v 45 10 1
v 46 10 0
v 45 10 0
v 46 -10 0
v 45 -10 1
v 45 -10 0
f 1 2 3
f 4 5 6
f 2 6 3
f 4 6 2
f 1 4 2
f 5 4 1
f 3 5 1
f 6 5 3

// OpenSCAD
/*
Triangles.scad
 Author: Tim Koopman
 https://github.com/tkoopman/Delta-Diamond/blob/master/OpenSCAD/Triangles.scad

         angleCA
           /|\
        a / H \ c
         /  |  \
 angleAB ------- angleBC
            b

Standard Parameters
	center: true/false
		If true same as centerXYZ = [true, true, true]

	centerXYZ: Vector of 3 true/false values [CenterX, CenterY, CenterZ]
		center must be left undef

	height: The 3D height of the Triangle. Ignored if heights defined

	heights: Vector of 3 height values heights @ [angleAB, angleBC, angleCA]
		If CenterZ is true each height will be centered individually, this means
		the shape will be different depending on CenterZ. Most times you will want
		CenterZ to be true to get the shape most people want.
*/

/* 
Triangle
	a: Length of side a
	b: Length of side b
	angle: angle at point angleAB
*/
module Triangle(
			a, b, angle, height=1, heights=undef,
			center=undef, centerXYZ=[false,false,false])
{
	// Calculate Heights at each point
	heightAB = ((heights==undef) ? height : heights[0])/2;
	heightBC = ((heights==undef) ? height : heights[1])/2;
	heightCA = ((heights==undef) ? height : heights[2])/2;
	centerZ = (center || (center==undef && centerXYZ[2]))?0:max(heightAB,heightBC,heightCA);

	// Calculate Offsets for centering
	offsetX = (center || (center==undef && centerXYZ[0]))?((cos(angle)*a)+b)/3:0;
	offsetY = (center || (center==undef && centerXYZ[1]))?(sin(angle)*a)/3:0;
	
	pointAB1 = [-offsetX,-offsetY, centerZ-heightAB];
	pointAB2 = [-offsetX,-offsetY, centerZ+heightAB];
	pointBC1 = [b-offsetX,-offsetY, centerZ-heightBC];
	pointBC2 = [b-offsetX,-offsetY, centerZ+heightBC];
	pointCA1 = [(cos(angle)*a)-offsetX,(sin(angle)*a)-offsetY, centerZ-heightCA];
	pointCA2 = [(cos(angle)*a)-offsetX,(sin(angle)*a)-offsetY, centerZ+heightCA];

	polyhedron(
		points=[	pointAB1, pointBC1, pointCA1,
					pointAB2, pointBC2, pointCA2 ],
		triangles=[	
			[0, 1, 2],
			[3, 5, 4],
			[0, 3, 1],
			[1, 3, 4],
			[1, 4, 2],
			[2, 4, 5],
			[2, 5, 0],
			[0, 5, 3] ] );
}

/*
Isosceles Triangle
	Exactly 2 of the following paramaters must be defined.
	If all 3 defined H will be ignored.
	b: length of side b
	angle: angle at points angleAB & angleBC.
*/
module Isosceles_Triangle(
			b, angle, H=undef, height=1, heights=undef,
			center=undef, centerXYZ=[true, false, false])
{
	valid = 	(angle!=undef)?((angle < 90) && (b!=undef||H!=undef)) : (b!=undef&&H!=undef);
	ANGLE = (angle!=undef) ? angle : atan(H / (b/2));
	a = (b==undef)?(H/sin((180-(angle*2))/2)) : 
		 (b / cos(ANGLE))/2;
	B = (b==undef)? (cos(angle)*a)*2:b;
	if (valid)
	{
		Triangle(a=a, b=B, angle=ANGLE, height=height, heights=heights,
					center=center, centerXYZ=centerXYZ);
	} else {
		echo("Invalid Isosceles_Triangle. Must specify any 2 of b, angle and H, and if angle used angle must be less than 90");
	}
}

/*
Right Angled Triangle
	Create a Right Angled Triangle where the hypotenuse will be calculated.

       |\
      a| \
       |  \
       ----
         b
	a: length of side a
	b: length of side b
*/
module Right_Angled_Triangle(
			a, b, height=1, heights=undef,
			center=undef, centerXYZ=[false, false, false])
{
	Triangle(a=a, b=b, angle=90, height=height, heights=heights,
				center=center, centerXYZ=centerXYZ);
}

/*
Wedge
	Is same as Right Angled Triangle with 2 different heights, and rotated.
	Good for creating support structures.
*/
module Wedge(a, b, w1, w2)
{
	rotate([90,0,0])
		Right_Angled_Triangle(a, b, heights=[w1, w2, w1], centerXYZ=[false, false, true]);
}

/*
Equilateral Triangle
	Create a Equilateral Triangle.

	l: Length of all sides (a, b & c)
	H: Triangle size will be based on the this 2D height
		When using H, l is ignored.
*/
module Equilateral_Triangle(
			l=10, H=undef, height=1, heights=undef,
			center=undef, centerXYZ=[true,false,false])
{
	L = (H==undef)?l:H/sin(60);
	Triangle(a=L,b=L,angle=60,height=height, heights=heights,
				center=center, centerXYZ=centerXYZ);
}

/*
Trapezoid
	Create a Basic Trapezoid (Based on Isosceles_Triangle)

            d
          /----\
         /  |   \
     a  /   H    \ c
       /    |     \
 angle ------------ angle
            b

	b: Length of side b
	angle: Angle at points angleAB & angleBC
	H: The 2D height at which the triangle should be cut to create the trapezoid
	heights: If vector of size 3 (Standard for triangles) both cd & da will be the same height, if vector have 4 values [ab,bc,cd,da] than each point can have different heights.
*/
module Trapezoid(
			b, angle=60, H, height=1, heights=undef,
			center=undef, centerXYZ=[true,false,false])
{
	validAngle = (angle < 90);
	adX = H / tan(angle);

	// Calculate Heights at each point
	heightAB = ((heights==undef) ? height : heights[0])/2;
	heightBC = ((heights==undef) ? height : heights[1])/2;
	heightCD = ((heights==undef) ? height : heights[2])/2;
	heightDA = ((heights==undef) ? height : ((len(heights) > 3)?heights[3]:heights[2]))/2;

	// Centers
	centerX = (center || (center==undef && centerXYZ[0]))?0:b/2;
	centerY = (center || (center==undef && centerXYZ[1]))?0:H/2;
	centerZ = (center || (center==undef && centerXYZ[2]))?0:max(heightAB,heightBC,heightCD,heightDA);

	// Points
	y = H/2;
	bx = b/2;
	dx = (b-(adX*2))/2;

	pointAB1 = [centerX-bx, centerY-y, centerZ-heightAB];
	pointAB2 = [centerX-bx, centerY-y, centerZ+heightAB];
	pointBC1 = [centerX+bx, centerY-y, centerZ-heightBC];
	pointBC2 = [centerX+bx, centerY-y, centerZ+heightBC];
	pointCD1 = [centerX+dx, centerY+y, centerZ-heightCD];
	pointCD2 = [centerX+dx, centerY+y, centerZ+heightCD];
	pointDA1 = [centerX-dx, centerY+y, centerZ-heightDA];
	pointDA2 = [centerX-dx, centerY+y, centerZ+heightDA];

	validH = (adX < b/2);

	if (validAngle && validH)
	{
		polyhedron(
			points=[	pointAB1, pointBC1, pointCD1, pointDA1,
						pointAB2, pointBC2, pointCD2, pointDA2 ],
			triangles=[	
				[0, 1, 2],
				[0, 2, 3],
				[4, 6, 5],
				[4, 7, 6],
				[0, 4, 1],
				[1, 4, 5],
				[1, 5, 2],
				[2, 5, 6],
				[2, 6, 3],
				[3, 6, 7],
				[3, 7, 0],
				[0, 7, 4]	] );
	} else {
		if (!validAngle) echo("Trapezoid invalid, angle must be less than 90");
		else echo("Trapezoid invalid, H is larger than triangle");
	}
}


// Examples
Triangle(a=5, b=15, angle=33, centerXYZ=[true,false,false]);
translate([20,0,0]) Right_Angled_Triangle(a=5, b=20, centerXYZ=[false,true,false]);
!translate([45,0,0]) Wedge(a=1, b=1, w1=20, w2=20);
translate([-20,0,0]) Trapezoid(b=20, angle=33, H=4, height=5, centerXYZ=[true,false,true]);

translate([0,10,0]) Isosceles_Triangle(b=20, angle=33);
translate([30,10,0]) Isosceles_Triangle(b=20, H=5);
translate([-30,10,0]) Isosceles_Triangle(angle=33, H=5, center=true);

translate([15,-25,0]) Equilateral_Triangle(l=20);
translate([-15,-25,0]) Equilateral_Triangle(H=20);
